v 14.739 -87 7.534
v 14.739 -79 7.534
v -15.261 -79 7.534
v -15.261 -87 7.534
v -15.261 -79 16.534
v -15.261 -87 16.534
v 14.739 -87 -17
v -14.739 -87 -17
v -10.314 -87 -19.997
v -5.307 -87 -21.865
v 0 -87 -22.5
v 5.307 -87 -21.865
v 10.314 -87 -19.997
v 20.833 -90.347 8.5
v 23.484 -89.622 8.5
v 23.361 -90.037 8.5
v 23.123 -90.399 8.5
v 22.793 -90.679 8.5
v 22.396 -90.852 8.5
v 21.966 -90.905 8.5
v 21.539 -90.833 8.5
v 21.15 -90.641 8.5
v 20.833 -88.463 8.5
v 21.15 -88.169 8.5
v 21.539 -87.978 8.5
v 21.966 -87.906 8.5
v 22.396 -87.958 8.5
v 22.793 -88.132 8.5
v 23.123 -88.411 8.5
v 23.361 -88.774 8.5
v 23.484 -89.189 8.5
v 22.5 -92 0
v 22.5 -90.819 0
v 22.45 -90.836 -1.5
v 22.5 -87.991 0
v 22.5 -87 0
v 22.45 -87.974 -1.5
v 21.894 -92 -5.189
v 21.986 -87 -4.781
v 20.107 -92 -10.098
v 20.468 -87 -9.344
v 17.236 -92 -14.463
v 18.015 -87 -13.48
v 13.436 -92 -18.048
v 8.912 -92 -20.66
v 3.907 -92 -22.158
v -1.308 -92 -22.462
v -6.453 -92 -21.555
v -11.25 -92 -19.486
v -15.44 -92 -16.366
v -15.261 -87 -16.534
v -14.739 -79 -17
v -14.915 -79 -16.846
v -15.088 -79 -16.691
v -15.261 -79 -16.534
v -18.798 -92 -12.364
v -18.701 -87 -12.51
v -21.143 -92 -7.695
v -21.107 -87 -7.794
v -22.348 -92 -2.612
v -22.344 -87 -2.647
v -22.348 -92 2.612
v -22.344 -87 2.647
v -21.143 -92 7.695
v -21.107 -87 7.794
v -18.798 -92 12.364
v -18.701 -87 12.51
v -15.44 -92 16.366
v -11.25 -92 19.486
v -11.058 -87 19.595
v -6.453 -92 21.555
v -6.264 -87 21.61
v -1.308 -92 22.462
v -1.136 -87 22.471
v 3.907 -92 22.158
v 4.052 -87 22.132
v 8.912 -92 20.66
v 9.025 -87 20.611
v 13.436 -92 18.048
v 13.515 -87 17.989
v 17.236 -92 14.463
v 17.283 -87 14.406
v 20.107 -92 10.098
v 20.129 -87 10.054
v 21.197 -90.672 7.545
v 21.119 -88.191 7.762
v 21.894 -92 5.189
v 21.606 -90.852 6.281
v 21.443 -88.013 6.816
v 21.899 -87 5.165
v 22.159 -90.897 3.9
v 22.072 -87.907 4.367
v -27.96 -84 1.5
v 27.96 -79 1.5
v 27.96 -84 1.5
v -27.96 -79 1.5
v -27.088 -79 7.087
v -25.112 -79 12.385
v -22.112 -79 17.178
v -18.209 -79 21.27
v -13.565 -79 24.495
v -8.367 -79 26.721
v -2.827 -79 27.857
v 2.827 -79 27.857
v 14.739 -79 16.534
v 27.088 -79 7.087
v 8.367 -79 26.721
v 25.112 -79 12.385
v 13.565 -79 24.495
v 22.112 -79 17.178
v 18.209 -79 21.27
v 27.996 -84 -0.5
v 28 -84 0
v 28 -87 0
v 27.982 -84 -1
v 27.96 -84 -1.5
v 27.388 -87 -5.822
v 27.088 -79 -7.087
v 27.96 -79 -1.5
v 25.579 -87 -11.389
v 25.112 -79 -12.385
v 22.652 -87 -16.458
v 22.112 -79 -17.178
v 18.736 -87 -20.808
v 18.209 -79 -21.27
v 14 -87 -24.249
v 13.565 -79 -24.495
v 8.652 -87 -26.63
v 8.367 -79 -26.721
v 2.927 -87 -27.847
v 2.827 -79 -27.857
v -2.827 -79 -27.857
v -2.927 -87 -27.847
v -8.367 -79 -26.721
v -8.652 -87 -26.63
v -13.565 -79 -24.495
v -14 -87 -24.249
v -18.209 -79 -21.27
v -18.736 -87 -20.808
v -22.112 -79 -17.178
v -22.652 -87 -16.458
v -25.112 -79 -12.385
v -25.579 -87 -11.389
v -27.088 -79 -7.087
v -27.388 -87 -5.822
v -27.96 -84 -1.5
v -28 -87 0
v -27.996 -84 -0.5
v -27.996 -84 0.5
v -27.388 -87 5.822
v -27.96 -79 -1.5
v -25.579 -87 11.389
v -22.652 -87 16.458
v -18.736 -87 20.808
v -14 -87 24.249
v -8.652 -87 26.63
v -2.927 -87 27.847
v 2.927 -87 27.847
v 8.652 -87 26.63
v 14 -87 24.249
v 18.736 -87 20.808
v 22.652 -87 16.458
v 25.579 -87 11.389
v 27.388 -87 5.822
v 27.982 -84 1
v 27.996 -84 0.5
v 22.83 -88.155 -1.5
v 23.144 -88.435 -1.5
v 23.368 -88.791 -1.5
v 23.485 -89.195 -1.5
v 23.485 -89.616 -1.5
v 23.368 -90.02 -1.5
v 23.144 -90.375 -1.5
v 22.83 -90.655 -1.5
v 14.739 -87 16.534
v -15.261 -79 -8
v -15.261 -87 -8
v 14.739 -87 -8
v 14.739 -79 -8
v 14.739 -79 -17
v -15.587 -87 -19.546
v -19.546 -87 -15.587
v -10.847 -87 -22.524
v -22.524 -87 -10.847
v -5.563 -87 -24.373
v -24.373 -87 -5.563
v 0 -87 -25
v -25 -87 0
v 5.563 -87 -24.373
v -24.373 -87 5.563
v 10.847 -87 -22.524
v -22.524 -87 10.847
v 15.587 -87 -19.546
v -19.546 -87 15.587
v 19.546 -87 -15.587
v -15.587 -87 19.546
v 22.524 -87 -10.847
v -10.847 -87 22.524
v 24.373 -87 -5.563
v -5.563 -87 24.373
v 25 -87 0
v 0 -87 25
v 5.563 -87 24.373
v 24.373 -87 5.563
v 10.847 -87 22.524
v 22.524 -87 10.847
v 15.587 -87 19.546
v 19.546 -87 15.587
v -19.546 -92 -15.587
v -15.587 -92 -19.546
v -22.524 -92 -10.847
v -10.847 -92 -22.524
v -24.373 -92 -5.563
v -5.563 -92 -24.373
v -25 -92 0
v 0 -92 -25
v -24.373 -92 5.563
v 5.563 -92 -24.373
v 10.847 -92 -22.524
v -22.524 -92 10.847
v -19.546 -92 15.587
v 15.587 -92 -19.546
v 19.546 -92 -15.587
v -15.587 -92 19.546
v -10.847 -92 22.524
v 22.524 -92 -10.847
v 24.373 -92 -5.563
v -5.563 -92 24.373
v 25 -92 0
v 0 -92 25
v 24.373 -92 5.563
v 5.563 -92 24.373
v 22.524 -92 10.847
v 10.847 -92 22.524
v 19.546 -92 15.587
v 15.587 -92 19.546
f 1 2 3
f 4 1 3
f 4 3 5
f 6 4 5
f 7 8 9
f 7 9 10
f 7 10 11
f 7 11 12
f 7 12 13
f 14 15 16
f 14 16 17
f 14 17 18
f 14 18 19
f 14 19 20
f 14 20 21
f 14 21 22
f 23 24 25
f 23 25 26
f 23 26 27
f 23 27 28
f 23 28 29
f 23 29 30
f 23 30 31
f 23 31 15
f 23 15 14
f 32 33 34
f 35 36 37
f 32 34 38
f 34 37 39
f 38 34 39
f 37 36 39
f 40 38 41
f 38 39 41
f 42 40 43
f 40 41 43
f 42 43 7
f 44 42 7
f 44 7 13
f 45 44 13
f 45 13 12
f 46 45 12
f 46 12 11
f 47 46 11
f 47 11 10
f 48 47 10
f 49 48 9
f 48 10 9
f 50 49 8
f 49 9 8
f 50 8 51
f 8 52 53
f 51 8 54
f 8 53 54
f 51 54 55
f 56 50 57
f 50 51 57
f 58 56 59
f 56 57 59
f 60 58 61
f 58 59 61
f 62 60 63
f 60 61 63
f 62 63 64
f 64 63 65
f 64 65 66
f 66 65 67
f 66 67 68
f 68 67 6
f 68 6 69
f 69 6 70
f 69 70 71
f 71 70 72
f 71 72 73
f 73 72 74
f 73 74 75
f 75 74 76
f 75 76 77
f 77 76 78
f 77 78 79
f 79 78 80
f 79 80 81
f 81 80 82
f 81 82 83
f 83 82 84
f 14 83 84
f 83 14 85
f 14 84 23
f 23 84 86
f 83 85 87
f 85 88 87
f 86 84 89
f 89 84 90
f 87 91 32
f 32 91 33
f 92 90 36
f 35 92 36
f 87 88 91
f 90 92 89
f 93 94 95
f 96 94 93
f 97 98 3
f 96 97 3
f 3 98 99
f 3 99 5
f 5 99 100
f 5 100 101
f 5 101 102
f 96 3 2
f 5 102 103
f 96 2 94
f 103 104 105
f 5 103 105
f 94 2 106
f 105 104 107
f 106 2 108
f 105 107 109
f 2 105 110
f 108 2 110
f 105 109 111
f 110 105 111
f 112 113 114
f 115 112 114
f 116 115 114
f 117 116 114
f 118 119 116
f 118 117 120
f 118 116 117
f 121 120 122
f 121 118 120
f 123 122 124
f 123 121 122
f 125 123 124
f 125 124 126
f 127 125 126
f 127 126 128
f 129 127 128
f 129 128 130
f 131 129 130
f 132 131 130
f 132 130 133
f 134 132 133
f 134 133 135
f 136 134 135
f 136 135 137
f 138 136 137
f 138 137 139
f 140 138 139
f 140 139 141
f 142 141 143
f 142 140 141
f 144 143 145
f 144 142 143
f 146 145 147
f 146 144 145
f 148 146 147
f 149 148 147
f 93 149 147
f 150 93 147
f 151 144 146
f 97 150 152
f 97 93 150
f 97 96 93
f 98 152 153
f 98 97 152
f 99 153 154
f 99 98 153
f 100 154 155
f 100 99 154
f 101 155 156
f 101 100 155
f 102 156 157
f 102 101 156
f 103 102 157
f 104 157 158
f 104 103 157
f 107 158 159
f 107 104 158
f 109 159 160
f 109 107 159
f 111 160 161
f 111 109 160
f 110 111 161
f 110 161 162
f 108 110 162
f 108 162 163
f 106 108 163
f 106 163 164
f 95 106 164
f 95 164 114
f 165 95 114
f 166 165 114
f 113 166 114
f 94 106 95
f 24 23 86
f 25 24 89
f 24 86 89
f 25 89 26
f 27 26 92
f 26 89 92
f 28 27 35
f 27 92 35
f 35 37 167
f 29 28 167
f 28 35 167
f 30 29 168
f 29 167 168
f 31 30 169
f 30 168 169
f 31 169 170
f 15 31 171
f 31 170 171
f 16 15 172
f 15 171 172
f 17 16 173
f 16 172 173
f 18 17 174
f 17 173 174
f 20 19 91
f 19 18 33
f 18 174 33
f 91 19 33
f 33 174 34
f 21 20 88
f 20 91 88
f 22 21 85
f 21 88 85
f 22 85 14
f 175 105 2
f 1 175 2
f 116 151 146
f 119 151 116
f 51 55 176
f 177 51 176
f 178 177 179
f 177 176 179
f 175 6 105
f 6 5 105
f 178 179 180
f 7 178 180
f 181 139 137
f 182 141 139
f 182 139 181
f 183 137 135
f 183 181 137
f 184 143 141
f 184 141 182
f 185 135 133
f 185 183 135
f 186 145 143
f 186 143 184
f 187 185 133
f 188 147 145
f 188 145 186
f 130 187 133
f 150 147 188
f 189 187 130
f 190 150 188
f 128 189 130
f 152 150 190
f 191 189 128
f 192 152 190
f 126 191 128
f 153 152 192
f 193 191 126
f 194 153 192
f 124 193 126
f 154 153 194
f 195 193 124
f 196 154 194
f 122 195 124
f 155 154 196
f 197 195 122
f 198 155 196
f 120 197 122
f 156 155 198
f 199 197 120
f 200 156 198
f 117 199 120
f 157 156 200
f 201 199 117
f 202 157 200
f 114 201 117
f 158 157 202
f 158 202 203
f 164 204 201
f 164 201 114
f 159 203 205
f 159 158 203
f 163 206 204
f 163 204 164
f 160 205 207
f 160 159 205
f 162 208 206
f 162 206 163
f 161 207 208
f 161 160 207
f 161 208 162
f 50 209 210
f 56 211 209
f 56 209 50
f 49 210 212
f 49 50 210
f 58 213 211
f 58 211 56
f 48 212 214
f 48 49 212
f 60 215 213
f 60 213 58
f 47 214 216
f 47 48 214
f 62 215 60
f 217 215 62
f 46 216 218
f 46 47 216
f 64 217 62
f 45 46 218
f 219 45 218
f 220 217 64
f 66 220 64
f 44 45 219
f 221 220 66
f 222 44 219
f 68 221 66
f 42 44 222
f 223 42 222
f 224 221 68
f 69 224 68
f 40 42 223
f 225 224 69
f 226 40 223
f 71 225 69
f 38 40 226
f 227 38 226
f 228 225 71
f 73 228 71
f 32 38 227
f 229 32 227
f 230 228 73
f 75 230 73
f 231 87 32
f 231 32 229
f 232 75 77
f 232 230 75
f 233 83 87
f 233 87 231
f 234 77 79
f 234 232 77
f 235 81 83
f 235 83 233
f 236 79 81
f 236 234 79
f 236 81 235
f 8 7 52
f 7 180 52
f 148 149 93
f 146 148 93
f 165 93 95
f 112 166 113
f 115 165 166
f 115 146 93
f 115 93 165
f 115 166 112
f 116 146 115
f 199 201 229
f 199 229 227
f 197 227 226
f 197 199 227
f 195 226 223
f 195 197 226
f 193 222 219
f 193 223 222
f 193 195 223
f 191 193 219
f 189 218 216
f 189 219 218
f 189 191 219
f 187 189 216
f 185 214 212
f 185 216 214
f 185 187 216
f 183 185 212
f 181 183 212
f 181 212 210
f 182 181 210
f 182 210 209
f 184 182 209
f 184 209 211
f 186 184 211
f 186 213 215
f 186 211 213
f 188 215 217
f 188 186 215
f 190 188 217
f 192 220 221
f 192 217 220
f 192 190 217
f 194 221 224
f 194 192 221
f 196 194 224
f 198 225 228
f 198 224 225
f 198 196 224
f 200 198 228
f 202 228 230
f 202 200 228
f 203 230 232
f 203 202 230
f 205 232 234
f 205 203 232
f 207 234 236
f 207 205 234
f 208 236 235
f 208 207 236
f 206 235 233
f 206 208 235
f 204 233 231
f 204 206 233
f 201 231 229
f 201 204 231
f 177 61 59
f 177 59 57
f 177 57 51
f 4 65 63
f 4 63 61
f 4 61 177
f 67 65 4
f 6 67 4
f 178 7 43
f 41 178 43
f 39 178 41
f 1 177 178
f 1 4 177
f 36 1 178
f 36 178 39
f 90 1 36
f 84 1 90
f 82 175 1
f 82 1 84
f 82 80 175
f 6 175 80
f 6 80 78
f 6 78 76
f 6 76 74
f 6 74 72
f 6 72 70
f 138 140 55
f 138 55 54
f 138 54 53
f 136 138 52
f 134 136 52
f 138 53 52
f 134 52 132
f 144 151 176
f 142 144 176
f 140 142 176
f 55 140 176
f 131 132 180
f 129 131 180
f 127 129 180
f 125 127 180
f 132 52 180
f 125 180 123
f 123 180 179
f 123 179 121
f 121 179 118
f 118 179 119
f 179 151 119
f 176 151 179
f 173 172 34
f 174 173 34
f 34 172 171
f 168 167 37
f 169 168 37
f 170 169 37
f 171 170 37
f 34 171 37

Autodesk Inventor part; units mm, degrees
ref_plane "YZ Plane" through (0, 0, 0) normal (1, 0, 0) x (0, 1, 0)
ref_plane "XZ Plane" through (0, 0, 0) normal (0, 1, 0) x (-1, 0, 0)
ref_plane "XY Plane" through (0, 0, 0) normal (0, 0, 1) x (1, 0, 0)
sketch "Sketch1" plane through (0, 0, 0) normal (0, 0, 1) x (1, 0, 0)
  line L0 (-27.5, 79) -> (27.5, 79)
  line L1 (27.5, 79) -> (27.5, -79)
  line L2 (27.5, -79) -> (-27.5, -79)
  line L3 (-27.5, -79) -> (-27.5, 79)
  line L4 (-20, 71.5) -> (20, 71.5)
  line L5 (20, 71.5) -> (20, -71.5)
  line L6 (20, -71.5) -> (-20, -71.5)
  line L7 (-20, -71.5) -> (-20, 71.5)
  point P0 (0, 0)
  point P1 (0, -79)
  dimension "d0" = 55
  dimension "d1" = 158
  dimension "d2" = 79
  dimension "d3" = 27.5
  dimension "d4" = 143
  dimension "d5" = 40
  dimension "d6" = 20
  dimension "d7" = 71.5
extrude "Extrusion1" add sketch "Sketch1" along normal mid plane 3
sketch "Sketch2" plane through (-27.5, 79, -1.5) normal (0, 1, 0) x (1, 0, 0)
  circle A0 centre (27.5, -1.5) radius 28
  point P0 (27.5, -1.5)
  dimension "d10" = 56
extrude "Extrusion2" add sketch "Sketch2" against normal blind 8
sketch "Sketch3" plane through (0, 0, 1.5) normal (0, 0, 1) x (1, 0, 0)
  line L0 (-25, 71) -> (25, 71)
  line L1 (25, 71) -> (25, -9)
  line L2 (25, -9) -> (-25, -9)
  line L3 (-25, -9) -> (-25, 71)
  circle A0 centre (-22, -6) radius 1.5
  circle A1 centre (-22, 68) radius 1.5
  circle A2 centre (22, -6) radius 1.5
  circle A3 centre (22, 68) radius 1.5
  line L4 (-28, 71) -> (28, 71) projected
  point P0 (0, 0)
  dimension "d13" = 80
  dimension "d14" = 50
  dimension "d15" = 25
  dimension "d16" = 3
  dimension "d18" = 3
  dimension "d19" = 3
  dimension "d20" = 3
  dimension "d21" = 44
  dimension "d22" = 44
  dimension "d23" = 22
  dimension "d24" = 22
  dimension "d25" = 74
  dimension "d27" = 74
  dimension "d77" = 0
  dimension "d78" = 3
  dimension "d79" = 3
extrude "Extrusion3" cut sketch "Sketch3" against normal blind 6 contours A0 | A1 | A2 | A3
sketch "Sketch4" plane through (-27.5, -79, 1.5) normal (0, -1, 0) x (1, 0, 0)
  circle A0 centre (27.5, -1.5) radius 28
  point P0 (27.5, -1.5)
extrude "Extrusion4" add sketch "Sketch4" along normal blind 8
sketch "Sketch5" plane through (0, 0, 0) normal (1, 0, 0) x (0, 1, 0)
  circle A0 centre (-81.5, 0) radius 1.5
  line L0 (-79, 28) -> (-79, -28) projected
  point P0 (0, 0)
  dimension "d33" = 3
  dimension "d34" = 2.5
extrude "Extrusion5" cut sketch "Sketch5" along normal through all both and the other way through all
thread "Thread1" size "M3x0.5" class "6H" standard "ANSI Metric M Profile" full length
sketch "Sketch6" plane through (0, -87, 0) normal (0, -1, 0) x (1, 0, 0)
  circle A0 centre (0, 0) radius 25
  circle A1 centre (0, 0) radius 22.5
  point P0 (0, 0)
  dimension "d39" = 50
  dimension "d40" = 45
extrude "Extrusion6" add sketch "Sketch6" along normal blind 5
thread "Thread2" size "M50x2" class "6g" standard "ANSI Metric M Profile" full length
sketch "Sketch7" plane through (0, -79, 0) normal (0, 1, 0) x (1, 0, 0)
  circle A0 centre (0, 0) radius 22.5 projected
  line L0 (14.7394, 17) -> (-15.2606, 17)
  line L1 (-15.2606, 17) -> (-15.2606, 8)
  line L2 (-15.2606, 8) -> (14.7394, 8)
  line L3 (14.7394, 8) -> (14.7394, 17)
  line L4 (14.7394, -7.5337) -> (-15.2606, -7.5337)
  line L5 (-15.2606, -7.5337) -> (-15.2606, -16.5337)
  line L6 (-15.2606, -16.5337) -> (14.7394, -16.5337)
  line L7 (14.7394, -16.5337) -> (14.7394, -7.5337)
  point P0 (0, 0)
  point P1 (-14.7394, 17)
  point P2 (-15.2606, 16.5337)
  dimension "d45" = 9
  dimension "d46" = 9
  dimension "d47" = 30
  dimension "d48" = 8
extrude "Extrusion7" cut sketch "Sketch7" against normal blind 10 contours L5 L4 L7 L6 | L3 L2 L1 A0 L0
sketch "Sketch8" plane through (0, 79, 0) normal (0, 1, 0) x (1, 0, 0)
  circle A0 centre (0, -17) radius 1.5
  circle A1 centre (-17, 0) radius 1.5
  circle A2 centre (0, 17) radius 1.5
  circle A3 centre (17, 0) radius 1.5
  point P0 (0, 0)
  dimension "d51" = 3
  dimension "d52" = 3
  dimension "d53" = 3
  dimension "d54" = 3
  dimension "d55" = 34
  dimension "d56" = 34
  dimension "d57" = 17
  dimension "d58" = 17
extrude "Extrusion8" cut sketch "Sketch8" against normal blind 10
sketch "Sketch10" plane through (0, 79, 0) normal (0, 1, 0) x (1, 0, 0)
  circle A0 centre (0, 0) radius 28
  circle A1 centre (0, 0) radius 26.5
  point P0 (0, 0)
  dimension "d80" = 53
  dimension "d81" = 56
extrude "Extrusion10" add sketch "Sketch10" along normal blind 5
thread "Thread3" size "M55x2" class "6H" standard "ANSI Metric M Profile" full length
sketch "Sketch11" plane through (0, 79, 0) normal (0, 1, 0) x (1, 0, 0)
  circle A0 centre (0, 0) radius 25 projected
  circle A1 centre (0, 25) radius 1.5
  point P0 (0, 0)
  dimension "d86" = 3
extrude "Extrusion11" cut sketch "Sketch11" against normal up to surface (8 mm away) contours A1 A0 | A0 A1 picked at (-0.0591, 24.5002) picked at (0.0534, 25.4938)
pattern_circular "Circular Pattern1" count 10 over 360 about axis through (0, 79, 0) along (0, -1, 0) of "Extrusion11"
sketch "Sketch12" plane through (0, 0, -1.5) normal (0, 0, -1) x (-1, 0, 0)
  circle A0 centre (-22, -89.4052) radius 1.5
  point P0 (0, 0)
  dimension "d93" = 3
  dimension "d94" = 22
extrude "Extrusion12" cut sketch "Sketch12" against normal blind 10
pattern_linear "Rectangular Pattern1" count 2 spacing 100 along (0, -1, 0) of "Extrusion3"
sketch "Sketch13" plane through (0, 79, -25) normal (0, 1, 0) x (1, 0, 0)
  circle A0 centre (9, -34) radius 5
  line L0 (14.7394, -17) -> (-15.2606, -17) projected
  circle A1 centre (9, -16) radius 5
  circle A2 centre (-9, -16) radius 5
  circle A3 centre (-9, -34) radius 5
  point P0 (0, -25)
  dimension "d100" = 10
  dimension "d101" = 10
  dimension "d104" = 18
  dimension "d108" = 9
  dimension "d109" = 9
  dimension "d110" = 9
  dimension "d111" = 10
  dimension "d112" = 10
  dimension "d113" = 9
  dimension "d114" = 9
  dimension "d115" = 9
  dimension "d116" = 9
extrude "Extrusion13" cut sketch "Sketch13" against normal up to surface (8 mm away)
sketch "Sketch14" plane through (-20, -71.5, 1.5) normal (0, 1, 0) x (1, 0, 0)
  arc A0 (4.7394, 18.0337) -> (4.7394, -15.0337) centre (20, 1.5) ccw projected
  line L0 (-7.5, 0) -> (47.5, 0) projected
  line L1 (-2.4455, 3.065) -> (42.5703, 3.065)
  line L2 (42.5703, 3.065) -> (42.5703, 0)
  line L3 (42.5703, 0) -> (-2.4455, 0)
  line L4 (-2.4455, 0) -> (-2.4455, 3.065)
  point P0 (20, 1.5)
  point P1 (-2.4455, 0)
extrude "Extrusion14" add sketch "Sketch14" along normal up to surface (142.5 mm away) contours L1 L2 L0 L4
ref_plane "Work Plane1" through (0, 0, 61.5) normal (0, 0, 1) x (1, 0, 0)
sketch "Sketch15" plane through (0, 0, 61.5) normal (0, 0, 1) x (1, 0, 0)
  line L0 (-22.4455, 66.5677) -> (-22.4455, -4.5677) projected
  line L1 (-22.4455, 66.5) -> (20.5545, 66.5)
  line L2 (20.5545, 66.5) -> (20.5545, -66.5)
  line L3 (20.5545, -66.5) -> (-22.4455, -66.5)
  line L4 (-22.4455, -66.5) -> (-22.4455, 66.5)
  line L5 (-22.4455, 56.5) -> (20.5545, 56.5)
  line L6 (-22.4455, 46.5) -> (20.5545, 46.5)
  line L7 (-22.4455, 36.5) -> (20.5545, 36.5)
  line L8 (-22.4455, 26.5) -> (20.5545, 26.5)
  line L9 (-22.4455, 16.5) -> (20.5545, 16.5)
  line L10 (-22.4455, 6.5) -> (20.5545, 6.5)
  line L11 (-22.4455, -3.5) -> (20.5545, -3.5)
  line L12 (-22.4455, -13.5) -> (20.5545, -13.5)
  line L13 (-22.4455, -23.5) -> (20.5545, -23.5)
  line L14 (-22.4455, -33.5) -> (20.5545, -33.5)
  line L15 (-22.4455, -43.5) -> (20.5545, -43.5)
  line L16 (-22.4455, -53.5) -> (20.5545, -53.5)
  line L17 (-22.4455, -63.5) -> (20.5545, -63.5)
  line L18 (15.5545, 66.5) -> (15.5545, -66.5)
  line L19 (10.5545, 66.5) -> (10.5545, -66.5)
  line L20 (5.5545, 66.5) -> (5.5545, -66.5)
  line L21 (0.5545, 66.5) -> (0.5545, -66.5)
  line L22 (-4.4455, 66.5) -> (-4.4455, -66.5)
  line L23 (-9.4455, 66.5) -> (-9.4455, -66.5)
  line L24 (-14.4455, 66.5) -> (-14.4455, -66.5)
  line L25 (-19.4455, 66.5) -> (-19.4455, -66.5)
  line L26 (-24.4455, 66.5) -> (-24.4455, -66.5)
  point P0 (0, 0)
  point P1 (15.5545, -43.5)
  point P2 (15.5545, -53.5)
  point P3 (5.5545, -43.5)
  point P4 (5.5545, -53.5)
  point P5 (10.5545, -53.5)
  point P6 (10.5545, -43.5)
  point P7 (-4.4455, -43.5)
  point P8 (-4.4455, -53.5)
  point P9 (0.5545, -53.5)
  point P10 (0.5545, -43.5)
  point P11 (-14.4455, -43.5)
  point P12 (-14.4455, -53.5)
  point P13 (-9.4455, -53.5)
  point P14 (-9.4455, -43.5)
  point P15 (-19.4455, -53.5)
  point P16 (-19.4455, -43.5)
  point P17 (10.5545, -23.5)
  point P18 (10.5545, -33.5)
  point P19 (15.5545, -33.5)
  point P20 (15.5545, -23.5)
  point P21 (0.5545, -23.5)
  point P22 (0.5545, -33.5)
  point P23 (5.5545, -33.5)
  point P24 (5.5545, -23.5)
  point P25 (-9.4455, -23.5)
  point P26 (-9.4455, -33.5)
  point P27 (-4.4455, -33.5)
  point P28 (-4.4455, -23.5)
  point P29 (-19.4455, -23.5)
  point P30 (-19.4455, -33.5)
  point P31 (-14.4455, -33.5)
  point P32 (-14.4455, -23.5)
  point P33 (15.5545, -3.5)
  point P34 (15.5545, -13.5)
  point P35 (5.5545, -3.5)
  point P36 (5.5545, -13.5)
  point P37 (10.5545, -13.5)
  point P38 (10.5545, -3.5)
  point P39 (-4.4455, -3.5)
  point P40 (-4.4455, -13.5)
  point P41 (0.5545, -13.5)
  point P42 (0.5545, -3.5)
  point P43 (-14.4455, -3.5)
  point P44 (-14.4455, -13.5)
  point P45 (-9.4455, -13.5)
  point P46 (-9.4455, -3.5)
  point P47 (-19.4455, -13.5)
  point P48 (-19.4455, -3.5)
  point P49 (-22.4455, -4.5677)
  point P50 (15.5545, 16.5)
  point P51 (15.5545, 6.5)
  point P52 (5.5545, 16.5)
  point P53 (5.5545, 6.5)
  point P54 (10.5545, 6.5)
  point P55 (10.5545, 16.5)
  point P56 (-4.4455, 16.5)
  point P57 (-4.4455, 6.5)
  point P58 (0.5545, 6.5)
  point P59 (0.5545, 16.5)
  point P60 (-14.4455, 16.5)
  point P61 (-14.4455, 6.5)
  point P62 (-9.4455, 6.5)
  point P63 (-9.4455, 16.5)
  point P64 (-19.4455, 6.5)
  point P65 (-19.4455, 16.5)
  point P66 (-19.4455, 36.5)
  point P67 (-19.4455, 26.5)
  point P68 (-14.4455, 26.5)
  point P69 (-14.4455, 36.5)
  point P70 (-19.4455, 56.5)
  point P71 (-19.4455, 46.5)
  point P72 (-14.4455, 46.5)
  point P73 (-14.4455, 56.5)
  point P74 (-9.4455, 56.5)
  point P75 (-9.4455, 46.5)
  point P76 (-4.4455, 46.5)
  point P77 (-4.4455, 56.5)
  point P78 (-9.4455, 36.5)
  point P79 (-9.4455, 26.5)
  point P80 (-4.4455, 26.5)
  point P81 (-4.4455, 36.5)
  point P82 (10.5545, 36.5)
  point P83 (10.5545, 26.5)
  point P84 (15.5545, 26.5)
  point P85 (15.5545, 36.5)
  point P86 (10.5545, 56.5)
  point P87 (10.5545, 46.5)
  point P88 (15.5545, 46.5)
  point P89 (15.5545, 56.5)
  point P90 (0.5545, 56.5)
  point P91 (0.5545, 46.5)
  point P92 (5.5545, 46.5)
  point P93 (5.5545, 56.5)
  point P94 (0.5545, 36.5)
  point P95 (0.5545, 26.5)
  point P96 (5.5545, 26.5)
  point P97 (5.5545, 36.5)
  dimension "d122" = 43
  dimension "d123" = 133
  dimension "d124" = 66.5
  dimension "d127" = 10
  dimension "d134" = 5
extrude "Extrusion15" cut sketch "Sketch15" against normal up to surface (63.065 mm away) contours L5 L24 L6 L25 | L7 L24 L8 L25 | L5 L22 L6 L23 | L9 L25 L10 L0 | L7 L22 L8 L23 | L5 L20 L6 L21 | L11 L25 L12 L4 L0 | L9 L23 L10 L24 | L7 L20 L8 L21 | L5 L18 L6 L19 | L11 L23 L12 L24 | L9 L21 L10 L22 | L13 L24 L14 L25 | L7 L18 L8 L19 | L11 L21 L12 L22 | L9 L19 L10 L20 | L15 L25 L16 L4 | L13 L22 L14 L23 | L11 L19 L12 L20 | L15 L23 L16 L24 | L9 L2 L10 L18 | L13 L20 L14 L21 | L11 L2 L12 L18 | L15 L21 L16 L22 | L13 L18 L14 L19 | L15 L19 L16 L20 | L15 L2 L16 L18
ref_plane "Work Plane2" through (0, -79, 0) normal (0, 1, 0) x (1, 0, 0)
split "Split1" plane through (0, -79, 0) removes the side toward (0, 1, 0)
sketch "Sketch16" plane through (0, -79, 0) normal (0, 1, 0) x (1, 0, 0)
  line L0 (-28, 1.5) -> (28, 1.5)
  line L1 (28, 1.5) -> (28, -1.5)
  line L2 (28, -1.5) -> (-28, -1.5)
  line L3 (-28, -1.5) -> (-28, 1.5)
  point P0 (0, 0)
  dimension "d142" = 3
  dimension "d143" = 1.5
  dimension "d144" = 56
  dimension "d145" = 28
extrude "Extrusion16" cut sketch "Sketch16" against normal blind 5
properties part number "case v0 bottom"
